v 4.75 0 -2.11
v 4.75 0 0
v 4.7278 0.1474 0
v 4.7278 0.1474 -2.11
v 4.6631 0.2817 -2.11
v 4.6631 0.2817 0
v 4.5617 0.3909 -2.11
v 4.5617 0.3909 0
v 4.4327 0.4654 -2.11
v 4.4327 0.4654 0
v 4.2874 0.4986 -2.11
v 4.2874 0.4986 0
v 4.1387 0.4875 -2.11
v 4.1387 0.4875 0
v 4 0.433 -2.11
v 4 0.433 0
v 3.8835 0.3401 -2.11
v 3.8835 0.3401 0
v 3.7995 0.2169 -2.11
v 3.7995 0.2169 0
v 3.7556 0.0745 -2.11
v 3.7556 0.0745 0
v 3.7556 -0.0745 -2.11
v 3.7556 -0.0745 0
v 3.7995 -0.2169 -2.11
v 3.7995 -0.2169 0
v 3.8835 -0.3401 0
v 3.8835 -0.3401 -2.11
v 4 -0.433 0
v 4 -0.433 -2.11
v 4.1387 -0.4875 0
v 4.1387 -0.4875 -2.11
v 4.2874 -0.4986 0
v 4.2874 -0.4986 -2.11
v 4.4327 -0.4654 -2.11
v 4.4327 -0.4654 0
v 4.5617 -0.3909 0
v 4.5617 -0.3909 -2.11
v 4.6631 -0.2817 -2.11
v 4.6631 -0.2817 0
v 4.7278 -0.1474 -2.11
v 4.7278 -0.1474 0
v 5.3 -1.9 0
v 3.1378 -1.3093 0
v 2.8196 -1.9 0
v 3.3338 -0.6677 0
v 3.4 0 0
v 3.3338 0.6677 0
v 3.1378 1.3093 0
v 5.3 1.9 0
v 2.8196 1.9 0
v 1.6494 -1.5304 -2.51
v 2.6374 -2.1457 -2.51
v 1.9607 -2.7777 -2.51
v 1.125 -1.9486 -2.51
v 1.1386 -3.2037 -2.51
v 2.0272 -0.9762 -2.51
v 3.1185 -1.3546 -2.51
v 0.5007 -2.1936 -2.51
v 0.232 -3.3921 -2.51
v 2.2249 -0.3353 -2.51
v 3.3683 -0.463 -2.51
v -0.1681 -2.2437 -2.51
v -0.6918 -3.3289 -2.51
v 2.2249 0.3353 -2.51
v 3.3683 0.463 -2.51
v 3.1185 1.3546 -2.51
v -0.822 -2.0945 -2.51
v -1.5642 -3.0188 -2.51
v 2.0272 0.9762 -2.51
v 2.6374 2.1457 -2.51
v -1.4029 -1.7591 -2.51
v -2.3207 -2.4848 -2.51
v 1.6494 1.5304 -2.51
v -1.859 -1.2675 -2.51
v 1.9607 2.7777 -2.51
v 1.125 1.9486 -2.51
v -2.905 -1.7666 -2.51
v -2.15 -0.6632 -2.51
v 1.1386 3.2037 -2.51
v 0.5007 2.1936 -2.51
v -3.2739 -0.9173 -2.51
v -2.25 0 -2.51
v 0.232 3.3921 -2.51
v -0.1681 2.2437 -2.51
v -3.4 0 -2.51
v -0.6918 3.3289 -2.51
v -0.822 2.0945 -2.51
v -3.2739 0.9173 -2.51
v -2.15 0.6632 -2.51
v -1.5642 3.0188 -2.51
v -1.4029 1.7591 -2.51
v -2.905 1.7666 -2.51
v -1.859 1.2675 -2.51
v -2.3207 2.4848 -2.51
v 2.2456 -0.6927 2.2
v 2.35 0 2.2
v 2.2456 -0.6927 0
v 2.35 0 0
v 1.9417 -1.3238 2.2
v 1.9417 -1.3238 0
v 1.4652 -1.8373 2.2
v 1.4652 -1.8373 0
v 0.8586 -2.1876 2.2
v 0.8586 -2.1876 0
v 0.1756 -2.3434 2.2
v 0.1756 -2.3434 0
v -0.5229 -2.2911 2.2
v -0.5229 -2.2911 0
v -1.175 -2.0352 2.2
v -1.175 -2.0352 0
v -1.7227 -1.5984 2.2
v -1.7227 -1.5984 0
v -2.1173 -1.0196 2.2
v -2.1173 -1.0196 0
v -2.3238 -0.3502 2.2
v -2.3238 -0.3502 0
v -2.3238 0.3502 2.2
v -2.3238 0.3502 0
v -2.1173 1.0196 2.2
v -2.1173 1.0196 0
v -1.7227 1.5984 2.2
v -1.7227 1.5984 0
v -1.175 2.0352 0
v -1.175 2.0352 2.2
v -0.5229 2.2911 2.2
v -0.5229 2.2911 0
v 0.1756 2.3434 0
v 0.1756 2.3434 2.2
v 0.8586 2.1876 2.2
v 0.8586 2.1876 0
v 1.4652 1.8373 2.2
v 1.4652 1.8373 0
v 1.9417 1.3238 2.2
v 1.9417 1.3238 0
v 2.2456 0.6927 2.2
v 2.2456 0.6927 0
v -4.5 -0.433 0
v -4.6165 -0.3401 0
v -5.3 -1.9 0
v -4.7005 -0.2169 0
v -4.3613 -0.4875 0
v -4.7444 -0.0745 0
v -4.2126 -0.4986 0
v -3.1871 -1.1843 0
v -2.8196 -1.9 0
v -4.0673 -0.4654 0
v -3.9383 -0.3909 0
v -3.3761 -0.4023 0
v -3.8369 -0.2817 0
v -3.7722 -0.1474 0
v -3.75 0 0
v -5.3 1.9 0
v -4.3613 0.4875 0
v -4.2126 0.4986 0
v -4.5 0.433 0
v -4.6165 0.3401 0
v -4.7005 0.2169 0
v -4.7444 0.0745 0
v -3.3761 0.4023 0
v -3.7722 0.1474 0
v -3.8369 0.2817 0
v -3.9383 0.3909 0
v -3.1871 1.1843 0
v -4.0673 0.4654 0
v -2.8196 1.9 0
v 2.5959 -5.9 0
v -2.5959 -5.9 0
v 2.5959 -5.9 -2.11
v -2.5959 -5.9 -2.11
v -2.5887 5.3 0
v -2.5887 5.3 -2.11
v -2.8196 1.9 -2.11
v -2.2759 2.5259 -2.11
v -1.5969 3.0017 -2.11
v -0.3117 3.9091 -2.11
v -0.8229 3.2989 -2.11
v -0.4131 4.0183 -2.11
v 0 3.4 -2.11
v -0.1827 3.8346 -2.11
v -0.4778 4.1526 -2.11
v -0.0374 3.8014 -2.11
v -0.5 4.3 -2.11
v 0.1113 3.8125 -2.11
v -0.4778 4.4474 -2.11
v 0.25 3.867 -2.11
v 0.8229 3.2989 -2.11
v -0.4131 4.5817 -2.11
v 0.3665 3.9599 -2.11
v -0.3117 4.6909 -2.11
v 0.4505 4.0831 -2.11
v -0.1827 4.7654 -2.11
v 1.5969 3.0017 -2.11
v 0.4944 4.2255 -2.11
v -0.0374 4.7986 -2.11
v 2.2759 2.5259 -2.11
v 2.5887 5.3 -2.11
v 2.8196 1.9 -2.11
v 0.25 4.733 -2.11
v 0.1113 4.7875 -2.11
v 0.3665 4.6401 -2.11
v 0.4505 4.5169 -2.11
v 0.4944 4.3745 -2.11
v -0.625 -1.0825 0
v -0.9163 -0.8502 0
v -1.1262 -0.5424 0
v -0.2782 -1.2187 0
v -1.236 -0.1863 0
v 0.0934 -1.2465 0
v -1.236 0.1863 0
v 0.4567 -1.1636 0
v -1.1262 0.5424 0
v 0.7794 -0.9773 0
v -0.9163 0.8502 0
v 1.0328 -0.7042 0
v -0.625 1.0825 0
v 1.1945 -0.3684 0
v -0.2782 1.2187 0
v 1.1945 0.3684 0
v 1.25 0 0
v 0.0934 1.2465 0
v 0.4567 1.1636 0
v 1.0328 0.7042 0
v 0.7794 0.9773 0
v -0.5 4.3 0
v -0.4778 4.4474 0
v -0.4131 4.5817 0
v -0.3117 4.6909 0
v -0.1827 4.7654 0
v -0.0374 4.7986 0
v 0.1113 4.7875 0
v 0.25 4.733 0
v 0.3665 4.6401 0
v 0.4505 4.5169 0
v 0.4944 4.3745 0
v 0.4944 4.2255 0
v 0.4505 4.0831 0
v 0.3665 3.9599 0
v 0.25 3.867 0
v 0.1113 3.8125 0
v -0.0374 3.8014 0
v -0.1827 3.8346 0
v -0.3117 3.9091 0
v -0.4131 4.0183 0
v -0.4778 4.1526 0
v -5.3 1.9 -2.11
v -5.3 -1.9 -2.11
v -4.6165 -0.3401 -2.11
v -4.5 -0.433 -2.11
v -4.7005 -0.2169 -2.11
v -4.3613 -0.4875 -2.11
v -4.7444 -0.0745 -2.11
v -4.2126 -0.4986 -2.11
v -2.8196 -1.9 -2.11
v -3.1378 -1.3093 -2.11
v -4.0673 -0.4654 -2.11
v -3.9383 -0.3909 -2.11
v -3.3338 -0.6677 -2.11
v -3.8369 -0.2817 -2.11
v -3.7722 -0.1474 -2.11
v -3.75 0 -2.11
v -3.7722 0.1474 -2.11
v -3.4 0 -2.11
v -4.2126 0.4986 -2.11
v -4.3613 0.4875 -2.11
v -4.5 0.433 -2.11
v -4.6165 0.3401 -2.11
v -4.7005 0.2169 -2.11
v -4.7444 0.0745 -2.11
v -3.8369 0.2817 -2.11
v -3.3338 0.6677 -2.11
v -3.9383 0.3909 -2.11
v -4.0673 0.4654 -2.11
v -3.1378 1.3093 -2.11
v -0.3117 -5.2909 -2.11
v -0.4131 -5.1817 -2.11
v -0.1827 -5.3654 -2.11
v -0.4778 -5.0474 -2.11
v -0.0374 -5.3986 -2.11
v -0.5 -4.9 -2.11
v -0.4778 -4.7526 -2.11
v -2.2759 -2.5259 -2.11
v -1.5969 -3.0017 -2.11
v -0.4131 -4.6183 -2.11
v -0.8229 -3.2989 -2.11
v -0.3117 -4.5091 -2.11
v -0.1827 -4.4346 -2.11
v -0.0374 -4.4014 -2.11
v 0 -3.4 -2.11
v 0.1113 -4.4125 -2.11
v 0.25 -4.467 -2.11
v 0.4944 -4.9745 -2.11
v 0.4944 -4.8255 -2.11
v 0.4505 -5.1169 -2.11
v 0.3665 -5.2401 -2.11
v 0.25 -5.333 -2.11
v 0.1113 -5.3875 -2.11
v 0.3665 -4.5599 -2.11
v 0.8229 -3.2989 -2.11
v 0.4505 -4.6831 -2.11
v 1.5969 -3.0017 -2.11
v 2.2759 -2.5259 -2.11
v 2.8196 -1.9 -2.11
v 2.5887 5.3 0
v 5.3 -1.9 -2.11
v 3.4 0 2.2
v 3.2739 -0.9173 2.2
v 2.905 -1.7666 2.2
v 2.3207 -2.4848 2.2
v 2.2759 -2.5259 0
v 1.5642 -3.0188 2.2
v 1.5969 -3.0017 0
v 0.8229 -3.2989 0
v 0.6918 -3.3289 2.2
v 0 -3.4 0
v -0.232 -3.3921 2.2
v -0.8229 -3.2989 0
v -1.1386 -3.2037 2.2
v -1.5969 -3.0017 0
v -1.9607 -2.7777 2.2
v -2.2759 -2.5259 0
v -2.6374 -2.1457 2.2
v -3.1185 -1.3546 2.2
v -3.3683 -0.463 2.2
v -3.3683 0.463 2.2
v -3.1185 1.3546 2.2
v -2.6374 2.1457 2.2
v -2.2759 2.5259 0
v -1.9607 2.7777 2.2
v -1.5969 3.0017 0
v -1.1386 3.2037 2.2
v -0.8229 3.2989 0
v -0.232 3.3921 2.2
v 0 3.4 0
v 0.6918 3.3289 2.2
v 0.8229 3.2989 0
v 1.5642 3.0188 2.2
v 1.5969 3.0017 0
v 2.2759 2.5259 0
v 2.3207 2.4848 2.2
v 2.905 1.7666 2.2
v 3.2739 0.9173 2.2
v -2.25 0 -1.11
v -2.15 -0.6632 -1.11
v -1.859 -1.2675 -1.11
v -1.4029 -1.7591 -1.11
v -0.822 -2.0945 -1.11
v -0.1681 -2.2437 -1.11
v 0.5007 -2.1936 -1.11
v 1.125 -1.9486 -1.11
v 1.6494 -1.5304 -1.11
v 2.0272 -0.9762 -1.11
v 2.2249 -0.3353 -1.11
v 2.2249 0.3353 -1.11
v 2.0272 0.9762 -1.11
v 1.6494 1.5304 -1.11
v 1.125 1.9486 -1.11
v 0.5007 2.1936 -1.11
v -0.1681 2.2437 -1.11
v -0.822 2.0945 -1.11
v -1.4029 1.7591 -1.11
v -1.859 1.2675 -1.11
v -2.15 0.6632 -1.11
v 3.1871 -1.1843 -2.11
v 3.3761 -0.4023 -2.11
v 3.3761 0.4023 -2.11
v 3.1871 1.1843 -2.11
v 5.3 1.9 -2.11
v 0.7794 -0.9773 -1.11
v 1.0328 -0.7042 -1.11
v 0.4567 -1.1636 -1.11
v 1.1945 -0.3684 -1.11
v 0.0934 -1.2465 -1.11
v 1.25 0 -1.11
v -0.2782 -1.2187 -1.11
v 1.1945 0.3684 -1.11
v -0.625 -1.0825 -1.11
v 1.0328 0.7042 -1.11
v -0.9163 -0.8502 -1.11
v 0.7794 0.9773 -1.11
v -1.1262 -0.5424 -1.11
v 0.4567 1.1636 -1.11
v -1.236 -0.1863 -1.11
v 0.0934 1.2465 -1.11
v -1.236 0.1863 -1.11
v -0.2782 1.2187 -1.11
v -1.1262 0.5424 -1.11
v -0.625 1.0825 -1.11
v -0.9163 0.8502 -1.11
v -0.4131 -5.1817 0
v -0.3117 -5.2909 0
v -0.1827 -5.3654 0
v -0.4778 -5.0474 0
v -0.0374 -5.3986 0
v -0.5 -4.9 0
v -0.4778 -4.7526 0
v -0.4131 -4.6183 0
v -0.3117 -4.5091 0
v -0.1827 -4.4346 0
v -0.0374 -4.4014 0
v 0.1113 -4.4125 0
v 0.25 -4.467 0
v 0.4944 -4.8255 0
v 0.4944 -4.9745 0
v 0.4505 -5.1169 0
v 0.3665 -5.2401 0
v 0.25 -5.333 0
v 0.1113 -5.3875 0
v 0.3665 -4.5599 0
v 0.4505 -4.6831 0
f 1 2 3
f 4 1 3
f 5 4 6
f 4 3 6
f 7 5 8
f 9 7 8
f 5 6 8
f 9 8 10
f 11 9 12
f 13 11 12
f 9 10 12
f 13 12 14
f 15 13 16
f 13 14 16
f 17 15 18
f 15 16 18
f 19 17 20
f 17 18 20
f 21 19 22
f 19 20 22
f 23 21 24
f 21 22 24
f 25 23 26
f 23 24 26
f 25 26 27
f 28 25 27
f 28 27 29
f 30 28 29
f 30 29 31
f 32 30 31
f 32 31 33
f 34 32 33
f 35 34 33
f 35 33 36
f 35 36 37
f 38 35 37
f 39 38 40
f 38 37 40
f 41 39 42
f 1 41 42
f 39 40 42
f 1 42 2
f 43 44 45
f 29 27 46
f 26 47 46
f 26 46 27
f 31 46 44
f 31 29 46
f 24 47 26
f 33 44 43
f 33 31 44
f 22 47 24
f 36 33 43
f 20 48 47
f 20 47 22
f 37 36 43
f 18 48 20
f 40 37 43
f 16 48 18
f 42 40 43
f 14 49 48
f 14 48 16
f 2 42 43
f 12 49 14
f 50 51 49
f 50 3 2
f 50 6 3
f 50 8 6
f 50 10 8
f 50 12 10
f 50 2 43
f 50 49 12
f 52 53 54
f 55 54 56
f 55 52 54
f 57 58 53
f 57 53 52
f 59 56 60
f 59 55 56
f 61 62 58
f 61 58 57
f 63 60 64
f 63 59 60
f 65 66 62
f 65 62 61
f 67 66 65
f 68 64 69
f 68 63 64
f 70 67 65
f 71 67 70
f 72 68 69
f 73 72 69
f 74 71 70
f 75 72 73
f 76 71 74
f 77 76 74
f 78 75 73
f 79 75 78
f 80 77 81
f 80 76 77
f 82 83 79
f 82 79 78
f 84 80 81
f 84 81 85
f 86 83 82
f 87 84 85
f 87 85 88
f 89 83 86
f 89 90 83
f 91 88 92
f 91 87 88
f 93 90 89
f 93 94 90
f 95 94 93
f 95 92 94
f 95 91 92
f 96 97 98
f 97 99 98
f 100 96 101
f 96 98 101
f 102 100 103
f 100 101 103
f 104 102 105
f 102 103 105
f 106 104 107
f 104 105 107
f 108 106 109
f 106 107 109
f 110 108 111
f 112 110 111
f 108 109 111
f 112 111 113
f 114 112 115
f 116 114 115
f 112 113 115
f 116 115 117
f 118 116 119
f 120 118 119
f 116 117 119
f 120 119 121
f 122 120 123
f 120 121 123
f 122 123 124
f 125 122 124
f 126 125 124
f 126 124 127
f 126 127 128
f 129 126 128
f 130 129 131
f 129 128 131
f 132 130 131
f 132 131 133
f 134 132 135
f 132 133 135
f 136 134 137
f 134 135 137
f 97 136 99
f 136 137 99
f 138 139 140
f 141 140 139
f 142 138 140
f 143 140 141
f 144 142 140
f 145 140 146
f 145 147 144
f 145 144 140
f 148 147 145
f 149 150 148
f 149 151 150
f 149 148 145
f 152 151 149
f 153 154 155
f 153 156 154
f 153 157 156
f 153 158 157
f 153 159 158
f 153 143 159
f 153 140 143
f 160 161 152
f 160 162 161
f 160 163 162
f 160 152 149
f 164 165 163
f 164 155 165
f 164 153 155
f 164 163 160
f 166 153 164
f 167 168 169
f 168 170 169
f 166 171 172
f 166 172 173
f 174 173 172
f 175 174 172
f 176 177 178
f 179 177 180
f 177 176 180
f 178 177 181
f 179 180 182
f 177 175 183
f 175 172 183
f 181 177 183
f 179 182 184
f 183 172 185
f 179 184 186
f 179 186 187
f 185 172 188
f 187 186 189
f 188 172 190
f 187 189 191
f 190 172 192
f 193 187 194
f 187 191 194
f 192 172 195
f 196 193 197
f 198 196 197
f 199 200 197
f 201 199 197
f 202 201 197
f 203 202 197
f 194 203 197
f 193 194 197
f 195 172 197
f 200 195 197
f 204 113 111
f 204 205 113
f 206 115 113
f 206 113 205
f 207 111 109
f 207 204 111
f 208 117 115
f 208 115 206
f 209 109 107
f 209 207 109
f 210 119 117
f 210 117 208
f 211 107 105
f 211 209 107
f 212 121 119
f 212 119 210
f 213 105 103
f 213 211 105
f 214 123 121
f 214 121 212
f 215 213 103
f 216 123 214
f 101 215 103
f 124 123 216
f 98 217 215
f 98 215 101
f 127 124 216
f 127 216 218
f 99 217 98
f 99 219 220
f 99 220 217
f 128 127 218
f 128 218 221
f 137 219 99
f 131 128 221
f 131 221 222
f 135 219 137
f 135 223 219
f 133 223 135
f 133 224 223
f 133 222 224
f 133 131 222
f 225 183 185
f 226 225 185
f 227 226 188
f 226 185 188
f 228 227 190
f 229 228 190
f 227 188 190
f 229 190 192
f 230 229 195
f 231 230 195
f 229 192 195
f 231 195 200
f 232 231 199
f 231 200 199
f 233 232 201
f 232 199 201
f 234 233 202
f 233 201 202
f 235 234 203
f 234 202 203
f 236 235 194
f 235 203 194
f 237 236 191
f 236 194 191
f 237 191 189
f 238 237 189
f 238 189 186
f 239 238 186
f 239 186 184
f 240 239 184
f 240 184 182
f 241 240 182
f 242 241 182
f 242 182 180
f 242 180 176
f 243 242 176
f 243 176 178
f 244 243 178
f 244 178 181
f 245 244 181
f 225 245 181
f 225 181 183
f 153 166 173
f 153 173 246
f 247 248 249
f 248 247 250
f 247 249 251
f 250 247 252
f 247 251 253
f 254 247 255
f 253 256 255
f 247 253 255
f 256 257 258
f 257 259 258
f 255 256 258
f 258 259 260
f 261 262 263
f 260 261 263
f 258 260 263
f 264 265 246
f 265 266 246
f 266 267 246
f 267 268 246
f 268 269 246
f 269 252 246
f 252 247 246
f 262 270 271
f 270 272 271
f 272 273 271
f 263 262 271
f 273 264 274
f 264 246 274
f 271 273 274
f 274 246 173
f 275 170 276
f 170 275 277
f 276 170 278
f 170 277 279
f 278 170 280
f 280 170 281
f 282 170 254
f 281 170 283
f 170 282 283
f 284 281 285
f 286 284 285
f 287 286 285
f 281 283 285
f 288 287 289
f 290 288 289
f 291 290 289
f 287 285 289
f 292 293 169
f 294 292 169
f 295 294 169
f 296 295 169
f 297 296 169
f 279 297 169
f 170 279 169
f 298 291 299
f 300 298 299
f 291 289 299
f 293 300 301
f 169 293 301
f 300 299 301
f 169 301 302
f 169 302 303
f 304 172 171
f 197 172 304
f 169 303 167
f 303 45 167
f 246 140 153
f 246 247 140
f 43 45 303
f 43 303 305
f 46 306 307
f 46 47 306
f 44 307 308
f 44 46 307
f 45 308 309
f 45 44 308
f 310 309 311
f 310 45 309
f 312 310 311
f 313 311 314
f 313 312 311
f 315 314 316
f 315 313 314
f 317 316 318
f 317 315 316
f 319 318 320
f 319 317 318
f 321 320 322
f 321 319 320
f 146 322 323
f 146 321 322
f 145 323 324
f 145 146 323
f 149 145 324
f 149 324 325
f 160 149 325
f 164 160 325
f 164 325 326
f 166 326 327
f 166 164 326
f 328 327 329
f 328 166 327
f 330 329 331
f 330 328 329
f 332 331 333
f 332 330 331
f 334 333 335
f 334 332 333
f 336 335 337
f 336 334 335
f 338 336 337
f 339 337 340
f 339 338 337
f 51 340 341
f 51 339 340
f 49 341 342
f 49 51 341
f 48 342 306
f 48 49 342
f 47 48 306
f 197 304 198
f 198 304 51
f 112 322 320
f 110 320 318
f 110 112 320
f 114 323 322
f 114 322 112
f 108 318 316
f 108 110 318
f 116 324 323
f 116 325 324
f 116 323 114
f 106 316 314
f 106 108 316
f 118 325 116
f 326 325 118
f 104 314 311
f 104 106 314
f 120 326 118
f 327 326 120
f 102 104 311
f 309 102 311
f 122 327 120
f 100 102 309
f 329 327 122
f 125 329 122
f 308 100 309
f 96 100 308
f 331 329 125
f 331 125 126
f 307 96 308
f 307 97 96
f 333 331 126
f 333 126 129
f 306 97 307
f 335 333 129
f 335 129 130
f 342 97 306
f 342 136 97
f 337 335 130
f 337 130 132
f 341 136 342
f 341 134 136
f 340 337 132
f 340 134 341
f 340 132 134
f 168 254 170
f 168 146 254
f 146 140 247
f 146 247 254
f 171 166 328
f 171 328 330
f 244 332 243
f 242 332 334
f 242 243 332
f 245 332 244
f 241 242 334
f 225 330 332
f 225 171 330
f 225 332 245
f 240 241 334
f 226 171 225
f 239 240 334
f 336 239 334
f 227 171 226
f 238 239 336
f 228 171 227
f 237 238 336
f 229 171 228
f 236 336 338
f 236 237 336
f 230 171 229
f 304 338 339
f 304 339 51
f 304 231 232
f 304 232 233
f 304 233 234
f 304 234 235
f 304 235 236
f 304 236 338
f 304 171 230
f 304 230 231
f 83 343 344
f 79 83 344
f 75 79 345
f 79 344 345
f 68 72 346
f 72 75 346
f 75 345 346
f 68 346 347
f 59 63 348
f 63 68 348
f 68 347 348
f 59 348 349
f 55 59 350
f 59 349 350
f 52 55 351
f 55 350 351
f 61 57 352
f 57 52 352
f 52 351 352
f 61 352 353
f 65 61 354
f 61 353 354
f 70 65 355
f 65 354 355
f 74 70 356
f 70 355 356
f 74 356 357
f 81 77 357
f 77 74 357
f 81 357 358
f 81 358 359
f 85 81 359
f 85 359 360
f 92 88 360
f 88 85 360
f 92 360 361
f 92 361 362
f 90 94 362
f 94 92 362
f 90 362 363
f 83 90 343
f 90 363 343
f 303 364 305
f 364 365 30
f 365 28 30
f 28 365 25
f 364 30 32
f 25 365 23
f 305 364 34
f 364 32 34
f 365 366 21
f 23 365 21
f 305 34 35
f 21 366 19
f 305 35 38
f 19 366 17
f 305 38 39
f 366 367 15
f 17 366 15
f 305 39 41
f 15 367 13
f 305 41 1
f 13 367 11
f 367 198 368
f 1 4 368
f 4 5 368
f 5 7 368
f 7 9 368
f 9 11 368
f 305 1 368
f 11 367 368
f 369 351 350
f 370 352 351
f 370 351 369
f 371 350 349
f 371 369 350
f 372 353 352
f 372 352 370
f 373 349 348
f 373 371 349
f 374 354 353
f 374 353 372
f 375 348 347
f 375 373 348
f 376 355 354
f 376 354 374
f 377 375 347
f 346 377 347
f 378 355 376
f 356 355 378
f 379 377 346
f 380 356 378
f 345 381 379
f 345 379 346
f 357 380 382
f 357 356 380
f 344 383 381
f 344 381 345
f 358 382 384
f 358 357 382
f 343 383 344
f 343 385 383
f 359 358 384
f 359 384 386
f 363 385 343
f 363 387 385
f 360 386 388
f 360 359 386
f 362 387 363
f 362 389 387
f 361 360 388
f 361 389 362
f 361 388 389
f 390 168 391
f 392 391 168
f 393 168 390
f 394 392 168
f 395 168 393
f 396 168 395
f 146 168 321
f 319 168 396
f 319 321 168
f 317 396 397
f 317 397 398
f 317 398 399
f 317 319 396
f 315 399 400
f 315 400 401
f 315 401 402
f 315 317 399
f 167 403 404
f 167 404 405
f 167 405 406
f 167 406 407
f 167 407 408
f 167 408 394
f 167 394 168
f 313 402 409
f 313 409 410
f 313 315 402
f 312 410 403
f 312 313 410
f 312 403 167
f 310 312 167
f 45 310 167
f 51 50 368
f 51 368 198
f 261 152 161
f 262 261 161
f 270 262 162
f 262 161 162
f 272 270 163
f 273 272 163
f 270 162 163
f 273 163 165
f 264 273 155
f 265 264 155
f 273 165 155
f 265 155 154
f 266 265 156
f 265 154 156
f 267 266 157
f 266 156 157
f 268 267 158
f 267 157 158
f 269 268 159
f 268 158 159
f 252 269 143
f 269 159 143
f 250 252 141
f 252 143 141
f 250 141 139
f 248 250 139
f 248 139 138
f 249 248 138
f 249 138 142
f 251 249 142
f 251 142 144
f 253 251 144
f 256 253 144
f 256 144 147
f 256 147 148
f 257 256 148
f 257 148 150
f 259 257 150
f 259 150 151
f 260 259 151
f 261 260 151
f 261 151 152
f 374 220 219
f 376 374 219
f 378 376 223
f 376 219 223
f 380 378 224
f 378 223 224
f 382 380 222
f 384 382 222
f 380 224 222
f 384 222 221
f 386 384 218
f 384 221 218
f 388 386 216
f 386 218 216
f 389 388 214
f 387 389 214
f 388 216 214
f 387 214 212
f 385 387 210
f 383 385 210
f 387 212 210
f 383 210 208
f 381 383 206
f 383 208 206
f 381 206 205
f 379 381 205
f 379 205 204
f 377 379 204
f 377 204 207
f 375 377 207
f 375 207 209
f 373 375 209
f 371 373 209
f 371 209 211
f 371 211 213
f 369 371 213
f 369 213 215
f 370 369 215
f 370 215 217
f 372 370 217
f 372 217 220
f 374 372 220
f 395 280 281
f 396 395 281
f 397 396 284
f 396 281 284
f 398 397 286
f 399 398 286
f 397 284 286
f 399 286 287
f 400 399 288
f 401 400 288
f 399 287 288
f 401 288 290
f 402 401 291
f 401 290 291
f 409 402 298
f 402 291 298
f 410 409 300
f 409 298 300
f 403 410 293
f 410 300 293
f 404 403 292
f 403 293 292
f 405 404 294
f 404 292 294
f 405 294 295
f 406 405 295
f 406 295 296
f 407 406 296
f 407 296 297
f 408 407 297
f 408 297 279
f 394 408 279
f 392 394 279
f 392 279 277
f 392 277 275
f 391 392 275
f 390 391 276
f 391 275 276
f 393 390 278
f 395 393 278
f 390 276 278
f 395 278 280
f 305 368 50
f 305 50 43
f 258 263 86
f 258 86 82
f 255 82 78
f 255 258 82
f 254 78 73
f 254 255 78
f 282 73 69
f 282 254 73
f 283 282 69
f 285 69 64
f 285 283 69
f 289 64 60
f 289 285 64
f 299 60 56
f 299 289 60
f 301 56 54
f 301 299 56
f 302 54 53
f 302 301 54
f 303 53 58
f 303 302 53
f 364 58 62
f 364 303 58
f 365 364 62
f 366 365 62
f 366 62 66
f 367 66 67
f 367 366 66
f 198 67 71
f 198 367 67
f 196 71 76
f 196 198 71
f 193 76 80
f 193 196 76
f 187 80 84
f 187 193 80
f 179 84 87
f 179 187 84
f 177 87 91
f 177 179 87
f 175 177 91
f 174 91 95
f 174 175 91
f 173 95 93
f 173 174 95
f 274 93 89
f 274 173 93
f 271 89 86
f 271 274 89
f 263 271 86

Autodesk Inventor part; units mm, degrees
ref_plane "YZ Plane" through (0, 0, 0) normal (1, 0, 0) x (0, 1, 0)
ref_plane "XZ Plane" through (0, 0, 0) normal (0, 1, 0) x (-1, 0, 0)
ref_plane "XY Plane" through (0, 0, 0) normal (0, 0, 1) x (1, 0, 0)
sketch "스케치1" plane through (0, 0, 0) normal (0, 0, 1) x (1, 0, 0)
  circle A0 centre (0, 0) radius 2.5
  line L0 (-6.35, 0) -> (6.35, 0) construction
  line L1 (-6.35, -1.9) -> (6.35, -1.9)
  line L2 (6.35, 1.9) -> (-6.35, 1.9)
  arc A1 (-6.35, 1.9) -> (-6.35, -1.9) centre (-6.35, 0) ccw
  arc A2 (6.35, -1.9) -> (6.35, 1.9) centre (6.35, 0) ccw
  line L3 (0, 14.5) -> (0, -14.5) construction
  circle A3 centre (0, 14.5) radius 0.5
  circle A4 centre (0, -14.5) radius 0.5
  circle A5 centre (6.35, 0) radius 0.5
  circle A6 centre (-6.35, 0) radius 0.5
  circle A7 centre (-4.25, 0) radius 0.5
  circle A8 centre (4.25, 0) radius 0.5
  line L4 (0, -1.9) -> (0, -18.5)
  line L5 (0, 1.9) -> (0, 15.9)
  arc A9 (1.9954, 14.0355) -> (-1.9954, 14.0355) centre (0, 13.9) ccw
  arc A10 (-1.9969, -16.6117) -> (1.9969, -16.6117) centre (0, -16.5) ccw
  circle A11 centre (0, 0) radius 3.4
  line L6 (-1.9954, 14.0355) -> (-2.8196, 1.9)
  line L7 (1.9954, 14.0355) -> (2.8196, 1.9)
  line L8 (-2.8196, -1.9) -> (-1.9969, -16.6117)
  line L9 (2.8196, -1.9) -> (1.9969, -16.6117)
  circle A12 centre (0, 12.5) radius 0.5
  circle A13 centre (0, 10.5) radius 0.5
  circle A14 centre (0, 8.5) radius 0.5
  circle A15 centre (0, 6.5) radius 0.5
  circle A16 centre (0, 4.5) radius 0.5
  circle A17 centre (0, 0) radius 2.35
  circle A18 centre (0, -16.5) radius 0.5
  circle A19 centre (0, -12.5) radius 0.5
  circle A20 centre (0, -10.5) radius 0.5
  circle A21 centre (0, -8.5) radius 0.5
  circle A22 centre (0, -6.5) radius 0.5
  circle A23 centre (0, -4.5) radius 0.5
  dimension "d0" = 5
  dimension "d1" = 1.9
  dimension "d2" = 16.5
  dimension "d3" = 29
  dimension "d4" = 1
  dimension "d5" = 1
  dimension "d6" = 1
  dimension "d7" = 1
  dimension "d10" = 2.1
  dimension "d17" = 2.1
  dimension "d24" = 16.6
  dimension "d25" = 14
  dimension "d26" = 4
  dimension "d27" = 4
  dimension "d28" = 6.8
  dimension "d31" = 2
  dimension "d36" = 4.7
  dimension "d39" = 2
  dimension "d46" = 2
extrude "돌출1" add sketch "스케치1" along normal blind 2.2 contours A0 L1 A17 L2 | A0 L2 A11 L1 | L2 A17 L5 A0 | A0 L5 A11 L2 | L1 A11 L4 A0 | A0 L4 A17 L1 | L5 A17 L2 A0 | A0 L2 A11 L5 | A17 L1 L2 | L2 L5 A17 | L4 A11 L1 A0 | A0 L1 A17 L4 | A17 L4 L1 | L2 A17 L1 A0 | A0 L1 A11 L2 | L5 L2 A17 | A17 L1 L4
extrude "돌출2" add sketch "스케치1" against normal blind 2.11 contours A0 L1 A17 L2 | A0 L2 A11 L1 | L2 A17 L5 A0 | A0 L5 A11 L2 | L1 A11 L4 A0 | A0 L4 A17 L1 | L5 A17 L2 A0 | A0 L2 A11 L5 | L2 A2 L1 A11 | A11 L5 A16 A15 A14 A13 A12 A3 A9 L7 | A17 L1 L2 | L2 L5 A17 | L4 A11 L1 A0 | A0 L1 A17 L4 | A17 L4 L1 | L9 A10 L4 A18 A4 A19 A20 A21 A22 A23 A11 | L2 A17 L1 A0 | A0 L1 A11 L2 | L5 L2 A17 | A11 L6 A9 L5 A3 A12 A13 A14 A15 A16 | A17 L1 L4 | L4 A23 A22 A21 A20 A19 A4 A18 A10 L8 A11 | A11 L1 A1 L2
extrude "돌출3" cut sketch "스케치1" along normal blind 3.65 contours A17 L1 L2 | L2 L5 A17 | A17 L4 L1 | L5 L2 A17 | A17 L1 L4
sketch "스케치2" plane through (0, 0, 0) normal (0, 0, 1) x (1, 0, 0)
  circle A0 centre (0, 0) radius 1.25
  dimension "d57" = 2.5
extrude "돌출4" cut sketch "스케치2" against normal blind 7.6
sketch "스케치3" plane through (0, 0, -2.11) normal (0, 0, -1) x (-1, 0, 0)
  circle A0 centre (0, 0) radius 2.25
  dimension "d60" = 4.5
extrude "돌출5" cut sketch "스케치3" against normal blind 1
sketch "스케치4" plane through (0, 0, -2.11) normal (0, 0, -1) x (-1, 0, 0)
  point P0 (0, 0)
sketch "스케치5" plane through (0, 0, -2.11) normal (0, 0, -1) x (-1, 0, 0)
  circle A0 centre (0, 0) radius 3.4
  circle A1 centre (0, 0) radius 2.25
  dimension "d63" = 4.5
  dimension "d64" = 6.8
extrude "돌출6" add sketch "스케치5" along normal blind 0.4
sketch "스케치6" plane through (0, 0, -2.11) normal (0, 0, -1) x (-1, 0, 0)
  line L0 (0.9014, 15.3127) -> (-1.0592, 15.3127)
  line L1 (-1.0592, 15.3127) -> (-1.0592, 3.6394)
  line L2 (-1.0592, 3.6394) -> (0.9014, 3.6394)
  line L3 (0.9014, 3.6394) -> (0.9014, 15.3127)
  line L4 (1.0141, -3.7747) -> (-1.0592, -3.7747)
  line L5 (-1.0592, -3.7747) -> (-1.0592, -17.386)
  line L6 (-1.0592, -17.386) -> (1.0141, -17.386)
  line L7 (1.0141, -17.386) -> (1.0141, -3.7747)
  point P0 (0, 0)
extrude "돌출7" add sketch "스케치6" against normal blind 2.11
sketch "스케치7" plane through (0, 0, -2.11) normal (0, 0, -1) x (-1, 0, 0)
  circle A0 centre (0, 14.3) radius 0.5
  arc A1 (1.9954, 14.0355) -> (-1.9954, 14.0355) centre (0, 13.9) ccw projected
  line L0 (0, 0) -> (0, 0.7105)
  line L1 (0, 0) -> (0.8275, 0)
  circle A2 centre (0, 12.3) radius 0.5
  circle A3 centre (0, 10.3) radius 0.5
  circle A4 centre (0, 8.3) radius 0.5
  circle A5 centre (0, 6.3) radius 0.5
  circle A6 centre (0, 4.3) radius 0.5
  line L2 (0, 15.9) -> (3.4178, 15.9)
  arc A7 (1.9954, 14.0355) -> (-1.9954, 14.0355) centre (0, 13.9) ccw projected
  circle A8 centre (0, -16.9) radius 0.5
  arc A9 (-1.9969, -16.6117) -> (1.9969, -16.6117) centre (0, -16.5) ccw projected
  circle A10 centre (0, -14.9) radius 0.5
  circle A11 centre (0, -12.9) radius 0.5
  circle A12 centre (0, -10.9) radius 0.5
  circle A13 centre (0, -8.9) radius 0.5
  circle A14 centre (0, -6.9) radius 0.5
  circle A15 centre (0, -4.9) radius 0.5
  point P0 (0, -18.5)
  dimension "d69" = 1
  dimension "d73" = 2
  dimension "d78" = 1.6
  dimension "d79" = 1
  dimension "d80" = 1.6
  dimension "d86" = 2
extrude "돌출8" cut sketch "스케치7" against normal blind 2.11
sketch "스케치9" plane through (0, 0, -2.11) normal (0, 0, -1) x (-1, 0, 0)
  circle A0 centre (0, 8.3) radius 0.5 projected
  line L0 (0.5, 8.3) -> (3.8465, 8.3)
  line L1 (3.8465, 8.3) -> (3.8465, 17.7965)
  line L2 (3.8465, 17.7965) -> (-4.3088, 17.7965)
  line L3 (-4.3088, 17.7965) -> (-4.3088, 8.3)
  line L4 (-4.3088, 8.3) -> (0.2806, 8.3)
  circle A1 centre (0, -8.9) radius 0.5 projected
  line L5 (0, -8.9) -> (5.2333, -8.9)
  line L6 (5.2333, -8.9) -> (5.2333, -19.7775)
  line L7 (5.2333, -19.7775) -> (-4.9031, -19.7775)
  line L8 (-4.9031, -19.7775) -> (-4.9031, -8.9)
  line L9 (-4.9031, -8.9) -> (0, -8.9)
  point P0 (0, 0)
  point P1 (0.5, -8.9)
  point P2 (-0.5, -8.9)
  point P3 (-0.5, 8.3)
extrude "돌출9" cut sketch "스케치9" against normal blind 10 contours A0 L4 L3 L2 L1 L0 | L5 L6 L7 L8 L9 A1
sketch "스케치10" plane through (0, 0, -2.11) normal (0, 0, -1) x (-1, 0, 0)
  line L0 (-0.0004, 7.8) -> (4.3151, 7.8)
  line L1 (4.3151, 7.8) -> (3.7805, 10.6296)
  line L2 (3.7805, 10.6296) -> (-3.3513, 10.6296)
  line L3 (-3.3513, 10.6296) -> (-3.4414, 7.8)
  line L4 (-3.4414, 7.8) -> (-0.0004, 7.8)
  arc A0 (-0.5, 8.3) -> (0.5, 8.3) centre (0, 8.3) ccw projected
  arc A1 (0.5, -8.9) -> (-0.5, -8.9) centre (0, -8.9) ccw projected
  line L5 (0, -8.4) -> (4.5069, -8.4)
  line L6 (4.5069, -8.4) -> (4.5069, -10.1694)
  line L7 (4.5069, -10.1694) -> (-4.0138, -10.1694)
  line L8 (-4.0138, -10.1694) -> (-4.0138, -8.4)
  line L9 (-4.0138, -8.4) -> (0, -8.4)
  point P0 (0, 0)
extrude "돌출10" cut sketch "스케치10" against normal blind 10
fillet "모깎기1" radius 2 2 edges at (-2.4189, 7.8, -1.055) (-2.4561, -8.4, -1.055)
sketch "스케치11" plane through (0, 0, -2.11) normal (0, 0, -1) x (-1, 0, 0)
  line L0 (-6.35, -1.9) -> (-2.8196, -1.9) projected
  line L1 (-2.8196, 1.9) -> (-6.35, 1.9) projected
  circle A0 centre (0, 6.3) radius 0.5 projected
  circle A1 centre (0, -6.9) radius 0.5 projected
  line L2 (2.8196, 1.9) -> (2.5455, 5.9355) projected
  line L3 (-2.5455, 5.9355) -> (-2.8196, 1.9) projected
  line L4 (0.5501, 7.8) -> (-0.5501, 7.8) projected
  line L5 (-2.8196, -1.9) -> (-2.5617, -6.5117) projected
  line L6 (2.5617, -6.5117) -> (2.8196, -1.9) projected
  point P0 (0, 0)
  point P1 (-4.5848, -1.9)
  point P2 (-4.5848, 1.9)
  point P3 (0, 7.8)
  dimension "d95" = 3.8
  dimension "d96" = 6.3
  dimension "d97" = 6.9
  dimension "d98" = 7.77
  dimension "d99" = 7.8
  dimension "d100" = 6.401
sketch "스케치12" plane through (0, 0, -2.11) normal (0, 0, -1) x (-1, 0, 0)
  line L0 (2.5785, 5.3) -> (-2.5887, 5.3)
  line L1 (-2.5455, 5.9355) -> (-2.8196, 1.9) projected
  circle A0 centre (0, 4.3) radius 0.5 projected
  line L2 (3.3006, -5.9) -> (-2.5959, -5.9)
  line L3 (-2.8196, -1.9) -> (-2.5617, -6.5117) projected
  circle A1 centre (0, -4.9) radius 0.5 projected
  line L4 (2.8196, 1.9) -> (6.35, 1.9) projected
  line L5 (5.3, 1.9) -> (5.3, -1.9)
  circle A2 centre (4.25, 0) radius 0.5 projected
  line L6 (-6.35, 1.9) -> (-2.8196, 1.9) projected
  line L7 (-5.3, 1.9) -> (-5.3, -2.6397)
  circle A3 centre (-4.25, 0) radius 0.5 projected
  line L8 (5.3, 1.9) -> (9.4862, 1.9)
  line L9 (9.4862, 1.9) -> (9.4862, -2.8158)
  line L10 (9.4862, -2.8158) -> (5.3, -2.8158)
  line L11 (5.3, -2.8158) -> (5.3, 1.9)
  line L12 (3.3006, -5.9) -> (-3.636, -5.9)
  line L13 (-3.636, -5.9) -> (-3.636, -9.5734)
  line L14 (-3.636, -9.5734) -> (3.3006, -9.5734)
  line L15 (3.3006, -9.5734) -> (3.3006, -5.9)
  line L16 (-5.3, -2.6397) -> (-8.4677, -2.6397)
  line L17 (-8.4677, -2.6397) -> (-8.4677, 1.9)
  line L18 (-8.4677, 1.9) -> (-5.3, 1.9)
  line L19 (-5.3, 1.9) -> (-5.3, -2.6397)
  line L20 (-2.5887, 5.3) -> (3.3006, 5.3)
  line L21 (3.3006, 5.3) -> (3.3006, 8.0343)
  line L22 (3.3006, 8.0343) -> (-2.5887, 8.0343)
  line L23 (-2.5887, 8.0343) -> (-2.5887, 5.3)
  point P0 (0, 0)
  point P1 (-0.0051, 5.3)
  point P2 (-2.5617, -5.9)
  point P3 (-2.5959, -5.9)
  dimension "d101" = 1
  dimension "d102" = 1
  dimension "d104" = 1.05
  dimension "d105" = 1.05
extrude "돌출11" cut sketch "스케치12" against normal blind 10 contours L7 L16 L17 L18 L6 | L0 L23 L22 L21 L20 | L15 L14 L13 L12 L2 | L4 L8 L9 L10 L11 L5
properties part number "180도 서보모터 십자축"
